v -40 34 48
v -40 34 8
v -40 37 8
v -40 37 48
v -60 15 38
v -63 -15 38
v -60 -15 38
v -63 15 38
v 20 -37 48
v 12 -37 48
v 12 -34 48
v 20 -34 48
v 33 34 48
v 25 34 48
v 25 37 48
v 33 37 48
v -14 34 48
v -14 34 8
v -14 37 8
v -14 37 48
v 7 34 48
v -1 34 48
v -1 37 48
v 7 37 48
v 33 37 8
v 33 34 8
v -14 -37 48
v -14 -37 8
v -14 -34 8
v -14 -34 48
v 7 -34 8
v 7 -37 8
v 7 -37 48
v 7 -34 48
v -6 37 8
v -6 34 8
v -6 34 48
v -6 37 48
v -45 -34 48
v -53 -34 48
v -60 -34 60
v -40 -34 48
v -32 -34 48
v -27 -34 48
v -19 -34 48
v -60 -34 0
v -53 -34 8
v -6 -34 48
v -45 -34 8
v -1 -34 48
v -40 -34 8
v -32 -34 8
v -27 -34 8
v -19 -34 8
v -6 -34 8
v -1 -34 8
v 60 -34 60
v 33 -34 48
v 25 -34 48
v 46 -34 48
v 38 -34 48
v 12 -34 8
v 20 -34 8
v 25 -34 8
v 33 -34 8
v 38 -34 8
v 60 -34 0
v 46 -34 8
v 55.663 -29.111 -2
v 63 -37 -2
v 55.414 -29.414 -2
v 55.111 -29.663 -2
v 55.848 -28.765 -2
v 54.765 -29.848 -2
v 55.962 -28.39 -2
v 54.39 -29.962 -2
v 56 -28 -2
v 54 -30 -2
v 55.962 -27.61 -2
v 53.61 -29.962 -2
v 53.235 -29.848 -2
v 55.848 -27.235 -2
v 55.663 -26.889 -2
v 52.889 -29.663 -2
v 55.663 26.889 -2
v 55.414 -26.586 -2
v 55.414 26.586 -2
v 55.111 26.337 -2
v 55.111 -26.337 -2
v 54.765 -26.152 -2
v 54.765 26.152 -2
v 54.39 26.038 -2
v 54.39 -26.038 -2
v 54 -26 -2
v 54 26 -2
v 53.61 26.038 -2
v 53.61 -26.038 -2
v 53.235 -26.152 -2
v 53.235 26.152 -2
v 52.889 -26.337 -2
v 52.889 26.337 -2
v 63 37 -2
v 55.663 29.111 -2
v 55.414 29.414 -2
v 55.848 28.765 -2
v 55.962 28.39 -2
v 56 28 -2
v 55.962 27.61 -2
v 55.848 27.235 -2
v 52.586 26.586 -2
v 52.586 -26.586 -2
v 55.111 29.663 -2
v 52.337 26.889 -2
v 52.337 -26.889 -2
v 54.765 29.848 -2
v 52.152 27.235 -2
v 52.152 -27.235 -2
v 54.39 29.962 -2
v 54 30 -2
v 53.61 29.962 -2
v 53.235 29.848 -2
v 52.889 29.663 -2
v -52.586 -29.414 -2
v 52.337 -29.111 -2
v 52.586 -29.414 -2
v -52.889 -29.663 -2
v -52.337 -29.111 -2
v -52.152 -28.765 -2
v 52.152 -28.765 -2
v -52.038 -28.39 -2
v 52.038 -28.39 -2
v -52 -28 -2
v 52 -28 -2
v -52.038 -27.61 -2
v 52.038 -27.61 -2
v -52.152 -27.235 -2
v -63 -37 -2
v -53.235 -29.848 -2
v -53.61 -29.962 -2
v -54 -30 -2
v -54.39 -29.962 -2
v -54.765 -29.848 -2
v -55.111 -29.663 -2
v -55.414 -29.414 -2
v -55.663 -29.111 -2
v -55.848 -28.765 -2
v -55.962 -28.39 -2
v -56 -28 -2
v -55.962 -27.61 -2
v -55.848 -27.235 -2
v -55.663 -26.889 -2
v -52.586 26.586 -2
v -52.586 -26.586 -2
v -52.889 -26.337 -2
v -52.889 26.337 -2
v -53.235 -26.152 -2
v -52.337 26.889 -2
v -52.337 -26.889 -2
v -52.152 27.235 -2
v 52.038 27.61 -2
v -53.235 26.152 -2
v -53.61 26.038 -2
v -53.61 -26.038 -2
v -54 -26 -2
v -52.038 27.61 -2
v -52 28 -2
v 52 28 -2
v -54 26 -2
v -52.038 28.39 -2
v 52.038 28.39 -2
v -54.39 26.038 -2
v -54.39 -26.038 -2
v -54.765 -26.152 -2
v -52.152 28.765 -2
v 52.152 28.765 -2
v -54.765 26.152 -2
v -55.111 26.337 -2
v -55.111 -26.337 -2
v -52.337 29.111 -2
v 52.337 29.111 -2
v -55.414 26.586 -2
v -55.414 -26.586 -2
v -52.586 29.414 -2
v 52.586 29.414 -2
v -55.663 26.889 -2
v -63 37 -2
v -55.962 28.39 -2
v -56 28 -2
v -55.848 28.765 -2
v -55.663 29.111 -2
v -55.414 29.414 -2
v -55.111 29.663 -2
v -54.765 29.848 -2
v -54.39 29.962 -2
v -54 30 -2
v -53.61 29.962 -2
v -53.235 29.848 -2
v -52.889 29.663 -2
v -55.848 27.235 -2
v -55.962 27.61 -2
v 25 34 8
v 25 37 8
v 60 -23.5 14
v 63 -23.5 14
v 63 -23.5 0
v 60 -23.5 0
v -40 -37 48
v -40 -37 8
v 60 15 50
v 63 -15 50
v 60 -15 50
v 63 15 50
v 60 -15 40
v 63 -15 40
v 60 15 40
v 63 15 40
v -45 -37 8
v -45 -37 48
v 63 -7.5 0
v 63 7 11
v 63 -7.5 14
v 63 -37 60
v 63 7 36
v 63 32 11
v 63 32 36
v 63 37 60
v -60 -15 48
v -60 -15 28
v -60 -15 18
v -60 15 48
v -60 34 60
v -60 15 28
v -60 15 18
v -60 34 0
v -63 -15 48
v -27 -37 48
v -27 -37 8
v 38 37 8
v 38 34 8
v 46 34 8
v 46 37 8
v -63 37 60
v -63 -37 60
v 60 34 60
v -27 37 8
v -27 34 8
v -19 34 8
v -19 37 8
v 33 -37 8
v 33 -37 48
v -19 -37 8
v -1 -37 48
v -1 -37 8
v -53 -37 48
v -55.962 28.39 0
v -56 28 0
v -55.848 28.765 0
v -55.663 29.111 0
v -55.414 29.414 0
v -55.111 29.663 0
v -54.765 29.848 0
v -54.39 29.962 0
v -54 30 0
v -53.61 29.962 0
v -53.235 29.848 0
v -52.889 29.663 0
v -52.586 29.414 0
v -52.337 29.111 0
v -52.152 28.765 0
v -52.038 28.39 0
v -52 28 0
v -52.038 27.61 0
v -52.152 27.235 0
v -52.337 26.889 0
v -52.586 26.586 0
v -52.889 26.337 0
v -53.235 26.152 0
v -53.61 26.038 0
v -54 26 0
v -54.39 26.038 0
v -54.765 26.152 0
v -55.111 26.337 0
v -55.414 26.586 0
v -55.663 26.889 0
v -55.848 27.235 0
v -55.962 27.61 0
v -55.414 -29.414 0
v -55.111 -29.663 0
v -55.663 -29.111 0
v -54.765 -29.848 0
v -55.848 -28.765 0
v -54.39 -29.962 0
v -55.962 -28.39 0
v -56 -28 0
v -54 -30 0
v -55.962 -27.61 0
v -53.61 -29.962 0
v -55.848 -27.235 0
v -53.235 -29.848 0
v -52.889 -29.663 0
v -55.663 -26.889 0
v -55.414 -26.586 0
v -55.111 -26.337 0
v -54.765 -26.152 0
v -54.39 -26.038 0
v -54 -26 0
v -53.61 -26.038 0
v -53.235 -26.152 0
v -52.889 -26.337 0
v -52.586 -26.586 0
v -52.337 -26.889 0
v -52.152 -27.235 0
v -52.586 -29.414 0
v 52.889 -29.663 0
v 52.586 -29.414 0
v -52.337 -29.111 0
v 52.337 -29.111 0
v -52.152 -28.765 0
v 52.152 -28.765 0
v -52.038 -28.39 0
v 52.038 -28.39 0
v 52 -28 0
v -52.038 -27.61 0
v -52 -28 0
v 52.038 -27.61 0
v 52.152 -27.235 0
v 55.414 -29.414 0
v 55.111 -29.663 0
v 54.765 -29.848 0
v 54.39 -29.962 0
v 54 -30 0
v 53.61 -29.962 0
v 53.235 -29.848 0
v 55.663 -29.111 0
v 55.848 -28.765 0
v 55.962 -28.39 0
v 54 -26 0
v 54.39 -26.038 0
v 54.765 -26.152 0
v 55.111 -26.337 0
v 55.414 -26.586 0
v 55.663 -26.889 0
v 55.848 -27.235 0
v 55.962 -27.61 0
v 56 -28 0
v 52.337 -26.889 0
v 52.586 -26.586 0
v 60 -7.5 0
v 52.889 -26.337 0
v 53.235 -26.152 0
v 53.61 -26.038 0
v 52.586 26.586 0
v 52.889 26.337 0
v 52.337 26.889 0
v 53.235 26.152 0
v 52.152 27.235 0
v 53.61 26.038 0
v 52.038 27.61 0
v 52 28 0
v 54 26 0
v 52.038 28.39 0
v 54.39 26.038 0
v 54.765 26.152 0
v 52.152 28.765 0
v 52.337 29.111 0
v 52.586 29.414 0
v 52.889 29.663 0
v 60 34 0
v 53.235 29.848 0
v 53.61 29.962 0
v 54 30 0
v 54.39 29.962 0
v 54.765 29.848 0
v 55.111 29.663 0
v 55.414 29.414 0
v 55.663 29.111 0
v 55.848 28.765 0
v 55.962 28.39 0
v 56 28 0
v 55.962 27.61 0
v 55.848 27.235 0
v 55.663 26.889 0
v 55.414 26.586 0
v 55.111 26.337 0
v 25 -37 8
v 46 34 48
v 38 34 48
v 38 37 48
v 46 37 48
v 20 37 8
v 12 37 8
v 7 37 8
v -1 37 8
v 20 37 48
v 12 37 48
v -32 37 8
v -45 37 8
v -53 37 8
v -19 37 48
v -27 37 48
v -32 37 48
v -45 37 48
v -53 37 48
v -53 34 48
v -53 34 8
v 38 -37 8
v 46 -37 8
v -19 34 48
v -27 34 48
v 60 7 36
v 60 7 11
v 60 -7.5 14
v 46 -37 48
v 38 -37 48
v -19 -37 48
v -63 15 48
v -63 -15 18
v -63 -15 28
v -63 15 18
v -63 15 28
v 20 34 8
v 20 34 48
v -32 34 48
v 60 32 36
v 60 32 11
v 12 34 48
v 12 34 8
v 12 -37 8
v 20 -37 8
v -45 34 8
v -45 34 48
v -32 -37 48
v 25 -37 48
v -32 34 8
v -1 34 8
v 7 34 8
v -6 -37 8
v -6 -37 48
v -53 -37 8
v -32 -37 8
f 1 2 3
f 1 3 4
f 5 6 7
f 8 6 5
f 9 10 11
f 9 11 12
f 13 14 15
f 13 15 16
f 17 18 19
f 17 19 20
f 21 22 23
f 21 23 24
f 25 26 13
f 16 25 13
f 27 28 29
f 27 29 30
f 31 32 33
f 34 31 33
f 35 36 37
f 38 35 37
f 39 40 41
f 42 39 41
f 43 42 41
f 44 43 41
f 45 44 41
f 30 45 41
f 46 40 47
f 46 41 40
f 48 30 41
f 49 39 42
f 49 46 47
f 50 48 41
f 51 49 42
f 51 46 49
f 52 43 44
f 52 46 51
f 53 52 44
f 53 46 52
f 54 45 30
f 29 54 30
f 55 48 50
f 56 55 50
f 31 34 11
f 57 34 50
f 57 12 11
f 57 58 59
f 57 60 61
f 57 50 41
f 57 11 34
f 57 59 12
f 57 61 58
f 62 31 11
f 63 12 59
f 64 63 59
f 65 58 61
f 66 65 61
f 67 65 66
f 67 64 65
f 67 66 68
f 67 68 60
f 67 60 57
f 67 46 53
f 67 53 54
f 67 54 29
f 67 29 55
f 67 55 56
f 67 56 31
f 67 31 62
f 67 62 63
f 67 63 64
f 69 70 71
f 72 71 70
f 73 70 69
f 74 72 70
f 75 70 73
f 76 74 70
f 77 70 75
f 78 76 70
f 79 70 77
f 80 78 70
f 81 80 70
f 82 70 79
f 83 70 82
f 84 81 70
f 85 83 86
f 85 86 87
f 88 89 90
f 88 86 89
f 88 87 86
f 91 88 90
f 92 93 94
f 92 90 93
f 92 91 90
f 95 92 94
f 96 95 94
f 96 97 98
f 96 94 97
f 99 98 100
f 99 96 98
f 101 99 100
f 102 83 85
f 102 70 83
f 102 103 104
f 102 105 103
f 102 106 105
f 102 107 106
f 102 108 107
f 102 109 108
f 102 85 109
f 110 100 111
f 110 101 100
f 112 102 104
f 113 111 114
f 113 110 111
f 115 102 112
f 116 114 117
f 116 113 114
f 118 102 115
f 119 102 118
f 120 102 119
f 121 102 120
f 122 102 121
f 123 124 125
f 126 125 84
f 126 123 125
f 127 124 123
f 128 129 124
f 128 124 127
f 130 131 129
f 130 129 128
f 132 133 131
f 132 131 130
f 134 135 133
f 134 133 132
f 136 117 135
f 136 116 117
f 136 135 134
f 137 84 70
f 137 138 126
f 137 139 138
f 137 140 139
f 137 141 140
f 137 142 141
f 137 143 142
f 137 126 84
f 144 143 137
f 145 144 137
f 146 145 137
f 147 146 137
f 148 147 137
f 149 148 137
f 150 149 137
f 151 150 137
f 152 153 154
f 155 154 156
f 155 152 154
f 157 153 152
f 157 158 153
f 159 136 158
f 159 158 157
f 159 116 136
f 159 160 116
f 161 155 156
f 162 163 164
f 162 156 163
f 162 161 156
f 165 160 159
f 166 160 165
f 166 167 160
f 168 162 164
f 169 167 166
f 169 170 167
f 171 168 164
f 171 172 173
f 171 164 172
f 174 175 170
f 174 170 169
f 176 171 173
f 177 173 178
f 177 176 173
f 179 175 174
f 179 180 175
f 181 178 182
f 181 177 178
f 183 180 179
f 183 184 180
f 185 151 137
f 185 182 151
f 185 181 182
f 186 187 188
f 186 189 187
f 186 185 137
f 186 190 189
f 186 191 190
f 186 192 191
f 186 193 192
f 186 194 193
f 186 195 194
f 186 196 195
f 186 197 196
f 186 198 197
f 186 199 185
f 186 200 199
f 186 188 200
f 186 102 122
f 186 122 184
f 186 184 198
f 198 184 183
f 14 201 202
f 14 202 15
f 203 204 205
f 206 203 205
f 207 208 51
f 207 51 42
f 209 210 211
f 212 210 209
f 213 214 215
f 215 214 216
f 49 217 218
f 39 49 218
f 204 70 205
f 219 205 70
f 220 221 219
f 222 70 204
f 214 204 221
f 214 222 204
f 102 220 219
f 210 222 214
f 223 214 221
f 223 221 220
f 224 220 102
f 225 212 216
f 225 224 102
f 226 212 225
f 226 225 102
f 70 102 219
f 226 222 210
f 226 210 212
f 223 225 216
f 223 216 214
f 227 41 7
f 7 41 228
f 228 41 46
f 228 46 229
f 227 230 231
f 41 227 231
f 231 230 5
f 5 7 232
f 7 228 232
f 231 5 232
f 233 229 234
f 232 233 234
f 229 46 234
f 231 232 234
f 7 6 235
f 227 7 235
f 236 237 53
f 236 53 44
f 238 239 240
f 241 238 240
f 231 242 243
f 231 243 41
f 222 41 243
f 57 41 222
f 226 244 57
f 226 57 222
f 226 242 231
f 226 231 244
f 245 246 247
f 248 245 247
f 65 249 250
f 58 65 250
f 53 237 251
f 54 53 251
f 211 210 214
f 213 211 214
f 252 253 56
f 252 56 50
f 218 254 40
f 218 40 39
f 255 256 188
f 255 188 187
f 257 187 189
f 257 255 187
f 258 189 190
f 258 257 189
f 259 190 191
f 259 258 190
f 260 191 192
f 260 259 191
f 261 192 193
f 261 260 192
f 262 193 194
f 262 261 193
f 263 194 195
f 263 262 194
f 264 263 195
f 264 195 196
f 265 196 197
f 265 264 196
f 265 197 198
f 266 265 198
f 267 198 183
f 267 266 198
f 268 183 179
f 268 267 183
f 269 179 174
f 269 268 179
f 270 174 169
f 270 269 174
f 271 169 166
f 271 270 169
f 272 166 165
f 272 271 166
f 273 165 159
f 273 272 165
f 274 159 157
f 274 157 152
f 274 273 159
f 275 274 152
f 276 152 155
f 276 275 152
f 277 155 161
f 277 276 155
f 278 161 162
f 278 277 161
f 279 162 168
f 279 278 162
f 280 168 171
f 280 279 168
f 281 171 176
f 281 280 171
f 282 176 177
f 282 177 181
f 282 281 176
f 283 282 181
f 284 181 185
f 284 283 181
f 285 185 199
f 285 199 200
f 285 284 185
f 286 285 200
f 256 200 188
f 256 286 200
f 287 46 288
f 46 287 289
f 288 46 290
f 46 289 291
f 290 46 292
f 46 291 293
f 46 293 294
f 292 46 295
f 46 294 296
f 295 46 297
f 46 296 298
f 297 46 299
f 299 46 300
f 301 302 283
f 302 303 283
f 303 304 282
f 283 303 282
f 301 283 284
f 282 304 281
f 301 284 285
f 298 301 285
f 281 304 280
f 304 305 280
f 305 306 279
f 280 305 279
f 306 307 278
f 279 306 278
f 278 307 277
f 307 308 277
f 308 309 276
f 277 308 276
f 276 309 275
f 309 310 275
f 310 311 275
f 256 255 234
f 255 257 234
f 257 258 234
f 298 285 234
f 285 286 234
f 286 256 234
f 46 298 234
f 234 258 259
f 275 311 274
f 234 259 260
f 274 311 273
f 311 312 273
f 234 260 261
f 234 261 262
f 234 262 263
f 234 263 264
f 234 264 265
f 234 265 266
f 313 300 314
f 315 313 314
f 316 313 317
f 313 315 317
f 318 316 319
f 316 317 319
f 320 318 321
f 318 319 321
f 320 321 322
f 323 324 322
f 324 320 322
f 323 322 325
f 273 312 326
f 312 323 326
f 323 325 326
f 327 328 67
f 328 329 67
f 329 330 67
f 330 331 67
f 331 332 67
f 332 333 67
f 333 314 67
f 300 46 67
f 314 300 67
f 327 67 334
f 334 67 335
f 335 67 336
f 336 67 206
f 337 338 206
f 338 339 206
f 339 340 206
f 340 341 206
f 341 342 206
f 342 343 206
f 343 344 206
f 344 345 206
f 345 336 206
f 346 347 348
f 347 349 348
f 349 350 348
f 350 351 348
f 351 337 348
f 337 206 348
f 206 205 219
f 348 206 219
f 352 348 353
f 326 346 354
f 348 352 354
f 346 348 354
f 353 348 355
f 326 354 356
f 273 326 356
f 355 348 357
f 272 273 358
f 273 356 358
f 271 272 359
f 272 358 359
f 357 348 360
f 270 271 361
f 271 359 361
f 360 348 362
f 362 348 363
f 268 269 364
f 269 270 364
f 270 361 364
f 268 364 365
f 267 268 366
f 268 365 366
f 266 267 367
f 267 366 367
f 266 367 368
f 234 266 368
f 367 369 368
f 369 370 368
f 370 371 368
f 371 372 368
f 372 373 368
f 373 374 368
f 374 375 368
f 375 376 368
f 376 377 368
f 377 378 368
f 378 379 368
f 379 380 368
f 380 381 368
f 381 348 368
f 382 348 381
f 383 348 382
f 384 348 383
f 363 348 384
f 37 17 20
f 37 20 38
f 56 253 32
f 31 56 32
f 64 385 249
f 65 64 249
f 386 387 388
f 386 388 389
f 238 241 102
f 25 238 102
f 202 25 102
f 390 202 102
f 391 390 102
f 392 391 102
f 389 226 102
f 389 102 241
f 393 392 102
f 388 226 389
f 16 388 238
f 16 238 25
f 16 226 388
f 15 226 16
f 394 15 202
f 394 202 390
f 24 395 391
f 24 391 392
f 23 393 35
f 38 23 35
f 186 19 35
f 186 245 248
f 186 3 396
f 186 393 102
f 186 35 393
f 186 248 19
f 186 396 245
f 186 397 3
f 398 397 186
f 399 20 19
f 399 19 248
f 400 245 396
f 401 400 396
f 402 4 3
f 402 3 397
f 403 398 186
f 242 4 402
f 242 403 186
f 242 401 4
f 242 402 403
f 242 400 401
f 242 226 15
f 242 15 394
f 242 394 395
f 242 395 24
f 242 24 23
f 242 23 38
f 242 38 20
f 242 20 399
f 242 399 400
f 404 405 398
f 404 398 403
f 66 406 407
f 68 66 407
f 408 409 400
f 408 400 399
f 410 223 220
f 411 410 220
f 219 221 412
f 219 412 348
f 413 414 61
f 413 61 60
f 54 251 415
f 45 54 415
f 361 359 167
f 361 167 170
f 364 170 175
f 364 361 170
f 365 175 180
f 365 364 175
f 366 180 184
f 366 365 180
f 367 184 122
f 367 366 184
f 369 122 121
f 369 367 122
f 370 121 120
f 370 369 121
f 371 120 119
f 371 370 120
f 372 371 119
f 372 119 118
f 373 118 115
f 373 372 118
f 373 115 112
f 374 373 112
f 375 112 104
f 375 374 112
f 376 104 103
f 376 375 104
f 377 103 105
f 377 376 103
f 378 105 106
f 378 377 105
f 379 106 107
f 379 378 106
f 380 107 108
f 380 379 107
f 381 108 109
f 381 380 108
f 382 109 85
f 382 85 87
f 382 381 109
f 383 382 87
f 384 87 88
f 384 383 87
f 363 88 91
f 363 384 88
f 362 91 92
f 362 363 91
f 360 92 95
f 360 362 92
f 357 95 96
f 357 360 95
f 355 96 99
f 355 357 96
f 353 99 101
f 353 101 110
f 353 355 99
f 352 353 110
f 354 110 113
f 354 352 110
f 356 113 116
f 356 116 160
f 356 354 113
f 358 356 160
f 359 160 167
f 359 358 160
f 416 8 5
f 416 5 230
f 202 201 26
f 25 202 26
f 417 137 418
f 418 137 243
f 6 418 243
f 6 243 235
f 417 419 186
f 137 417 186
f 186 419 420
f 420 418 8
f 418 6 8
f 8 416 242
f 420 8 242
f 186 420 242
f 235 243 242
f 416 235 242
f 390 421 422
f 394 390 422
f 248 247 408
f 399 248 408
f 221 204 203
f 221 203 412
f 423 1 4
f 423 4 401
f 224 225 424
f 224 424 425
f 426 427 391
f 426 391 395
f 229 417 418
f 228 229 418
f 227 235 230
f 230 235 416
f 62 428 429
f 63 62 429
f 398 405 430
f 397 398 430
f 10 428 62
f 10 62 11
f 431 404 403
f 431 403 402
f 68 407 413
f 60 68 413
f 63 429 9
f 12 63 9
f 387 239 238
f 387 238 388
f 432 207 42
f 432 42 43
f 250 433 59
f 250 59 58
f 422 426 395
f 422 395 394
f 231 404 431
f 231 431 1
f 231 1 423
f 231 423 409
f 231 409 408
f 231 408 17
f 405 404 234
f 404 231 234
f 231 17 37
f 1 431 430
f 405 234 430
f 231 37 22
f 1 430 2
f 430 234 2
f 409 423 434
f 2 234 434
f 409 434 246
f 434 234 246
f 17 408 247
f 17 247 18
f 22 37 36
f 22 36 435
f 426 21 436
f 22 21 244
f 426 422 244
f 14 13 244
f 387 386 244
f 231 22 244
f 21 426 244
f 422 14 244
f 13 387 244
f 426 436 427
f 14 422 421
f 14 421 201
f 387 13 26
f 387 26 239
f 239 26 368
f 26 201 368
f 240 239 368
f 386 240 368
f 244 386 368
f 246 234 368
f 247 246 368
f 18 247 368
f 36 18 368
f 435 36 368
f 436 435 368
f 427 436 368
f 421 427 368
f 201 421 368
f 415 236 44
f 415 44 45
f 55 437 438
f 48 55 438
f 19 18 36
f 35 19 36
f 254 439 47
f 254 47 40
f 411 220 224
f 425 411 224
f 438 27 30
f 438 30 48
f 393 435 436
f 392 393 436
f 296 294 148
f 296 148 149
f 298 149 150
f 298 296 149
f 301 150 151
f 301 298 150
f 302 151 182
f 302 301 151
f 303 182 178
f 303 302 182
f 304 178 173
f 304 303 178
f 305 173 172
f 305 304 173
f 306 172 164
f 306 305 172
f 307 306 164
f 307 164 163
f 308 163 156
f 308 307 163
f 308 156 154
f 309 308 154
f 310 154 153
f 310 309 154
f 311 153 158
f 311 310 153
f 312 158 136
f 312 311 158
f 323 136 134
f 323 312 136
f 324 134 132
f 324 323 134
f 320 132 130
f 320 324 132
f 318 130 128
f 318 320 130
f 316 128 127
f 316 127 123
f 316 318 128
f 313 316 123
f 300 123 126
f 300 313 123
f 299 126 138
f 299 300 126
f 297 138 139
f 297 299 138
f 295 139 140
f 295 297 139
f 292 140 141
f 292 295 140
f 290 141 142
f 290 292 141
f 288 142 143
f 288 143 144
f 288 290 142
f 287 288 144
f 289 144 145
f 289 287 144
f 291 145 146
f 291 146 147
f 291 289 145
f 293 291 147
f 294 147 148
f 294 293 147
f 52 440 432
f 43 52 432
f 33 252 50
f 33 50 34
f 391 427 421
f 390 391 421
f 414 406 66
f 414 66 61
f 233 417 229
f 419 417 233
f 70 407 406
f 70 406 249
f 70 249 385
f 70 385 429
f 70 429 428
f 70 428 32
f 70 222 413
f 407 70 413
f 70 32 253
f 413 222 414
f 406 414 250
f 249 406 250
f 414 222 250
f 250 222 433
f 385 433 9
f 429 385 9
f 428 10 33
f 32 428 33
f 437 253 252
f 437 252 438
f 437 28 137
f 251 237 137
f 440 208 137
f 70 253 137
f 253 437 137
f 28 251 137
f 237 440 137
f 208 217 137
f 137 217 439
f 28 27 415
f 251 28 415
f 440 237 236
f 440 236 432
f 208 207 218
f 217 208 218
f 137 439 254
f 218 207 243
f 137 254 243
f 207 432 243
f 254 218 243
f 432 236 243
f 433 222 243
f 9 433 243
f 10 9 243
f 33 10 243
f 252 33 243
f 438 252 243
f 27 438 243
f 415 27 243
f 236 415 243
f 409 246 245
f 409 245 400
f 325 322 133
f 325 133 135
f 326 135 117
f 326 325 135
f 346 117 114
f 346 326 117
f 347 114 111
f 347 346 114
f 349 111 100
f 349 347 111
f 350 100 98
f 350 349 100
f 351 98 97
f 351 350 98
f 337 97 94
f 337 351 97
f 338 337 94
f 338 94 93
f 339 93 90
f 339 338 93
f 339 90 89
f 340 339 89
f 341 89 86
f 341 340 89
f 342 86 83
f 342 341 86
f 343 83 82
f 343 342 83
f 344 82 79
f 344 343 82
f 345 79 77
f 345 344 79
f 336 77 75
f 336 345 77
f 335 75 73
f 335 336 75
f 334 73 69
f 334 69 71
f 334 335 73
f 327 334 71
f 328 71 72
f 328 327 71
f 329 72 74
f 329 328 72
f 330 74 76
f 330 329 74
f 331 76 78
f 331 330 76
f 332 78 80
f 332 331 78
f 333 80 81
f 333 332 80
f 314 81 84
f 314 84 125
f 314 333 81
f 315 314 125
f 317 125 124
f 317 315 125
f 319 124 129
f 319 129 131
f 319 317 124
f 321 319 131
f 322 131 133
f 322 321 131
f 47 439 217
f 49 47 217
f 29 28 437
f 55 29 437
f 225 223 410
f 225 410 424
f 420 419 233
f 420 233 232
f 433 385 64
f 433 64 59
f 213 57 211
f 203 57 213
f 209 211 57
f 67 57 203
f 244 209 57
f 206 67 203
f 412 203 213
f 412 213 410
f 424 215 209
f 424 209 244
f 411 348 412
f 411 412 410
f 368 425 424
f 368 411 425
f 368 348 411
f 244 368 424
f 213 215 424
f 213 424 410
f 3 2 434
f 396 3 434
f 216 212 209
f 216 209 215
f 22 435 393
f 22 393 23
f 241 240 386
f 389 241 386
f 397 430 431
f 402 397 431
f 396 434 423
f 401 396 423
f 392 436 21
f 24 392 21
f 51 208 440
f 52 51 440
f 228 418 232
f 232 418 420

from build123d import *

# Parameters (mm, degrees)
ESBO_O1_W                = 126
ESBO_O1_H                = 74
ESBO_O1_W_2              = 120
ESBO_O1_H_2              = 68
RESSALTO_EXTRUS_O1_DEPTH = 60
ESBO_O2_W                = 126
ESBO_O2_H                = 74
ESBO_O2_R                = 2
RESSALTO_EXTRUS_O2_DEPTH = 2
ESBO_O3_W                = 25
ESBO_O3_H                = 25
ESBO_O3_W_2              = 14
ESBO_O3_H_2              = 16
ESBO_O3_W_3              = 10
ESBO_O3_H_3              = 30
CORTE_EXTRUS_O1_DEPTH    = 10
ESBO_O6_W                = 8
ESBO_O6_H                = 40
CORTE_EXTRUS_O2_DEPTH    = 115.214710086
ESBO_O7_W                = 10
ESBO_O7_H                = 30
CORTE_EXTRUS_O3_DEPTH    = 12


with BuildPart() as part:
    # Esboço1 → Ressalto-extrusão1 (new body)
    with BuildSketch(Plane.XY):
        Rectangle(ESBO_O1_W, ESBO_O1_H)
        Rectangle(ESBO_O1_W_2, ESBO_O1_H_2, mode=Mode.SUBTRACT)
    extrude(amount=RESSALTO_EXTRUS_O1_DEPTH)

    # Esboço2 → Ressalto-extrusão2 (add)
    with BuildSketch(Plane(origin=(0, 0, 0), x_dir=(-1, 0, 0), z_dir=(0, 0, -1))):
        Rectangle(ESBO_O2_W, ESBO_O2_H)
        with Locations((-54, -28)):
            Circle(ESBO_O2_R, mode=Mode.SUBTRACT)
        with Locations((54, -28)):
            Circle(ESBO_O2_R, mode=Mode.SUBTRACT)
        with Locations((54, 28)):
            Circle(ESBO_O2_R, mode=Mode.SUBTRACT)
        with Locations((-54, 28)):
            Circle(ESBO_O2_R, mode=Mode.SUBTRACT)
    extrude(amount=RESSALTO_EXTRUS_O2_DEPTH)

    # Esboço3 → Corte-extrusão1 (cut)
    with BuildSketch(Plane(origin=(63, 0, 0), x_dir=(0, 0, -1), z_dir=(1, 0, 0))):
        with Locations((-23.5, 19.5)):
            Rectangle(ESBO_O3_W, ESBO_O3_H)
        with Locations((-7, -15.5)):
            Rectangle(ESBO_O3_W_2, ESBO_O3_H_2)
        with Locations((-45, 0)):
            Rectangle(ESBO_O3_W_3, ESBO_O3_H_3)
    extrude(amount=-CORTE_EXTRUS_O1_DEPTH, mode=Mode.SUBTRACT)

    # Esboço6 → Corte-extrusão2 (cut, through all)
    with BuildSketch(Plane.XZ.offset(37)):
        with Locations((-49, 28)):
            Rectangle(ESBO_O6_W, ESBO_O6_H)
        with Locations((-36, 28)):
            Rectangle(ESBO_O6_W, ESBO_O6_H)
        with Locations((-23, 28)):
            Rectangle(ESBO_O6_W, ESBO_O6_H)
        with Locations((-10, 28)):
            Rectangle(ESBO_O6_W, ESBO_O6_H)
        with Locations((3, 28)):
            Rectangle(ESBO_O6_W, ESBO_O6_H)
        with Locations((16, 28)):
            Rectangle(ESBO_O6_W, ESBO_O6_H)
        with Locations((29, 28)):
            Rectangle(ESBO_O6_W, ESBO_O6_H)
        with Locations((42, 28)):
            Rectangle(ESBO_O6_W, ESBO_O6_H)
    extrude(amount=-CORTE_EXTRUS_O2_DEPTH, mode=Mode.SUBTRACT)

    # Esboço7 → Corte-extrusão3 (cut)
    with BuildSketch(Plane.ZY.offset(63)):
        with Locations((43, 0)):
            Rectangle(ESBO_O7_W, ESBO_O7_H)
        with Locations((23, 0)):
            Rectangle(ESBO_O7_W, ESBO_O7_H)
    extrude(amount=-CORTE_EXTRUS_O3_DEPTH, mode=Mode.SUBTRACT)


solid = part.part
